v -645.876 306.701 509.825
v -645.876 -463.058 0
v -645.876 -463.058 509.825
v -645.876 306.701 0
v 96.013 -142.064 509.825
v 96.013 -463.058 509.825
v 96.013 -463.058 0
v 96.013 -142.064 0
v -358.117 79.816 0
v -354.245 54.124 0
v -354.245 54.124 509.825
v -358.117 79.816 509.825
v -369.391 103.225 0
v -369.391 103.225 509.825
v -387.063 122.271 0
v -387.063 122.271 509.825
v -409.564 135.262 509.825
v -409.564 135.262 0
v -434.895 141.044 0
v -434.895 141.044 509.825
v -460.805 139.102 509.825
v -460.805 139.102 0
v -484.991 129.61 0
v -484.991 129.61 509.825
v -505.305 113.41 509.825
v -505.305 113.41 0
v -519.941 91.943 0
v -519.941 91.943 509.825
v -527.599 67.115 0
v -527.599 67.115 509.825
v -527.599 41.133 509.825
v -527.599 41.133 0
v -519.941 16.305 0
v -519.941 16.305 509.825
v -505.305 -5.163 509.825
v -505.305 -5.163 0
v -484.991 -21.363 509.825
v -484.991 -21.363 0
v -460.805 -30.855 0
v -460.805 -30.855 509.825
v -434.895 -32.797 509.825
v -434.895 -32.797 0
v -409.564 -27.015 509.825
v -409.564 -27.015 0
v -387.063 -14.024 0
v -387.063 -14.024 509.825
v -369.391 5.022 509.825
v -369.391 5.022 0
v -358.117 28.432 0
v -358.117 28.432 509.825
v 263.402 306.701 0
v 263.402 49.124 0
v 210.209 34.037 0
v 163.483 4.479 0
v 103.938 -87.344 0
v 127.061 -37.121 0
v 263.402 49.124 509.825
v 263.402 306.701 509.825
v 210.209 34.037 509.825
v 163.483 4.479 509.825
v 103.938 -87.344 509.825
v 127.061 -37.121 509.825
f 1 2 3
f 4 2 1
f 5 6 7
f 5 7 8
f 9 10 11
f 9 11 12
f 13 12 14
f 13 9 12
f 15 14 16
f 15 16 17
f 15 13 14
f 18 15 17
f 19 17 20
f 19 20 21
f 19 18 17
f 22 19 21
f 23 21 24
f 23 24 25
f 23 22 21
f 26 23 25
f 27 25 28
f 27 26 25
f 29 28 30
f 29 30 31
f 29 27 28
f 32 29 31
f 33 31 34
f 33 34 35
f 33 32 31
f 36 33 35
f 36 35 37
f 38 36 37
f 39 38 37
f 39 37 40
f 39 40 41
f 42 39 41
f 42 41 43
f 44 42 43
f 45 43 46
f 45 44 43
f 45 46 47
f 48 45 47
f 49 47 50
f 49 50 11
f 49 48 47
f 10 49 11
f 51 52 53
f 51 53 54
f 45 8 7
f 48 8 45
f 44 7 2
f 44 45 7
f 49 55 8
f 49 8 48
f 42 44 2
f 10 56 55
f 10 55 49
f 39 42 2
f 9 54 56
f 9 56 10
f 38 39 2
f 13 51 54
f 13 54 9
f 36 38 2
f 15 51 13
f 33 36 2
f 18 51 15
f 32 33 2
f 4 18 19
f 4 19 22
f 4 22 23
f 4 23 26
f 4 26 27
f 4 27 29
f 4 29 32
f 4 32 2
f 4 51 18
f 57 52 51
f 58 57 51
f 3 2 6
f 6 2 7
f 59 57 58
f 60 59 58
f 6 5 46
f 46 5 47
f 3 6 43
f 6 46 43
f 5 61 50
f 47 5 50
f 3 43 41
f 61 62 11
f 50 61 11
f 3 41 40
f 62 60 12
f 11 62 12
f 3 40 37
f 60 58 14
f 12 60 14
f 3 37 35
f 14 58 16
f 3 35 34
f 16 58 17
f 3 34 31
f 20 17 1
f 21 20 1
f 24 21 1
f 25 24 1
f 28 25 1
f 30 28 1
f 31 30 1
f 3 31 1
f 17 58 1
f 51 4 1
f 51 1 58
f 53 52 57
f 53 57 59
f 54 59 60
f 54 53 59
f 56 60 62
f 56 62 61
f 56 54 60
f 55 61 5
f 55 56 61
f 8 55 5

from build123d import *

# Parameters (mm, degrees)
F0_W        = 909.2783331871
F0_H        = 769.7594761848
F0_R        = 87.1640503321
F1_DEPTH    = 509.82533
F2_W        = 512.1824108064
F2_H        = 509.82533
F3_DEPTH    = 167.38894
F4_T1_DEPTH = 509.82533


# Not quite as in the source:
# - a fillet or chamfer that OpenCascade refuses, or shapes differently, is made with other operations: its cross-section is extruded or revolved along the edge and cut away or added


with BuildPart() as f1:
    # F0 (on Top) → F1 (new body)
    with BuildSketch(Plane.XY):
        with Locations((-191.2371218204, -78.1787037849)):
            Rectangle(F0_W, F0_H)
        with Locations((-441.408932209, 54.1237108409)):
            Circle(F0_R, mode=Mode.SUBTRACT)
    extrude(amount=F1_DEPTH)

    # F2 (on face) → F3 (cut)
    with BuildSketch(Plane.YZ.offset(263.4020447731)):
        with Locations((-206.9672364742, 254.912665)):
            Rectangle(F2_W, F2_H)
    extrude(amount=-F3_DEPTH, mode=Mode.SUBTRACT)

    # F4: fillet of radius 192.8795849713 on 1 edges, made by hand

    # F4_s2 → F4_t1 (join)
    with BuildSketch(Plane.XY):
        with BuildLine():
            ThreePointArc((263.4020447731, 49.1239689291), (143.7734985232, -15.0088679899), (96.0131047731, -142.0637956315))
            Line((96.0131047731, -142.0637956315), (96.0131047731, 49.1239689291))
            Line((96.0131047731, 49.1239689291), (263.4020447731, 49.1239689291))
        make_face()
    extrude(amount=F4_T1_DEPTH)


solid = f1.part
